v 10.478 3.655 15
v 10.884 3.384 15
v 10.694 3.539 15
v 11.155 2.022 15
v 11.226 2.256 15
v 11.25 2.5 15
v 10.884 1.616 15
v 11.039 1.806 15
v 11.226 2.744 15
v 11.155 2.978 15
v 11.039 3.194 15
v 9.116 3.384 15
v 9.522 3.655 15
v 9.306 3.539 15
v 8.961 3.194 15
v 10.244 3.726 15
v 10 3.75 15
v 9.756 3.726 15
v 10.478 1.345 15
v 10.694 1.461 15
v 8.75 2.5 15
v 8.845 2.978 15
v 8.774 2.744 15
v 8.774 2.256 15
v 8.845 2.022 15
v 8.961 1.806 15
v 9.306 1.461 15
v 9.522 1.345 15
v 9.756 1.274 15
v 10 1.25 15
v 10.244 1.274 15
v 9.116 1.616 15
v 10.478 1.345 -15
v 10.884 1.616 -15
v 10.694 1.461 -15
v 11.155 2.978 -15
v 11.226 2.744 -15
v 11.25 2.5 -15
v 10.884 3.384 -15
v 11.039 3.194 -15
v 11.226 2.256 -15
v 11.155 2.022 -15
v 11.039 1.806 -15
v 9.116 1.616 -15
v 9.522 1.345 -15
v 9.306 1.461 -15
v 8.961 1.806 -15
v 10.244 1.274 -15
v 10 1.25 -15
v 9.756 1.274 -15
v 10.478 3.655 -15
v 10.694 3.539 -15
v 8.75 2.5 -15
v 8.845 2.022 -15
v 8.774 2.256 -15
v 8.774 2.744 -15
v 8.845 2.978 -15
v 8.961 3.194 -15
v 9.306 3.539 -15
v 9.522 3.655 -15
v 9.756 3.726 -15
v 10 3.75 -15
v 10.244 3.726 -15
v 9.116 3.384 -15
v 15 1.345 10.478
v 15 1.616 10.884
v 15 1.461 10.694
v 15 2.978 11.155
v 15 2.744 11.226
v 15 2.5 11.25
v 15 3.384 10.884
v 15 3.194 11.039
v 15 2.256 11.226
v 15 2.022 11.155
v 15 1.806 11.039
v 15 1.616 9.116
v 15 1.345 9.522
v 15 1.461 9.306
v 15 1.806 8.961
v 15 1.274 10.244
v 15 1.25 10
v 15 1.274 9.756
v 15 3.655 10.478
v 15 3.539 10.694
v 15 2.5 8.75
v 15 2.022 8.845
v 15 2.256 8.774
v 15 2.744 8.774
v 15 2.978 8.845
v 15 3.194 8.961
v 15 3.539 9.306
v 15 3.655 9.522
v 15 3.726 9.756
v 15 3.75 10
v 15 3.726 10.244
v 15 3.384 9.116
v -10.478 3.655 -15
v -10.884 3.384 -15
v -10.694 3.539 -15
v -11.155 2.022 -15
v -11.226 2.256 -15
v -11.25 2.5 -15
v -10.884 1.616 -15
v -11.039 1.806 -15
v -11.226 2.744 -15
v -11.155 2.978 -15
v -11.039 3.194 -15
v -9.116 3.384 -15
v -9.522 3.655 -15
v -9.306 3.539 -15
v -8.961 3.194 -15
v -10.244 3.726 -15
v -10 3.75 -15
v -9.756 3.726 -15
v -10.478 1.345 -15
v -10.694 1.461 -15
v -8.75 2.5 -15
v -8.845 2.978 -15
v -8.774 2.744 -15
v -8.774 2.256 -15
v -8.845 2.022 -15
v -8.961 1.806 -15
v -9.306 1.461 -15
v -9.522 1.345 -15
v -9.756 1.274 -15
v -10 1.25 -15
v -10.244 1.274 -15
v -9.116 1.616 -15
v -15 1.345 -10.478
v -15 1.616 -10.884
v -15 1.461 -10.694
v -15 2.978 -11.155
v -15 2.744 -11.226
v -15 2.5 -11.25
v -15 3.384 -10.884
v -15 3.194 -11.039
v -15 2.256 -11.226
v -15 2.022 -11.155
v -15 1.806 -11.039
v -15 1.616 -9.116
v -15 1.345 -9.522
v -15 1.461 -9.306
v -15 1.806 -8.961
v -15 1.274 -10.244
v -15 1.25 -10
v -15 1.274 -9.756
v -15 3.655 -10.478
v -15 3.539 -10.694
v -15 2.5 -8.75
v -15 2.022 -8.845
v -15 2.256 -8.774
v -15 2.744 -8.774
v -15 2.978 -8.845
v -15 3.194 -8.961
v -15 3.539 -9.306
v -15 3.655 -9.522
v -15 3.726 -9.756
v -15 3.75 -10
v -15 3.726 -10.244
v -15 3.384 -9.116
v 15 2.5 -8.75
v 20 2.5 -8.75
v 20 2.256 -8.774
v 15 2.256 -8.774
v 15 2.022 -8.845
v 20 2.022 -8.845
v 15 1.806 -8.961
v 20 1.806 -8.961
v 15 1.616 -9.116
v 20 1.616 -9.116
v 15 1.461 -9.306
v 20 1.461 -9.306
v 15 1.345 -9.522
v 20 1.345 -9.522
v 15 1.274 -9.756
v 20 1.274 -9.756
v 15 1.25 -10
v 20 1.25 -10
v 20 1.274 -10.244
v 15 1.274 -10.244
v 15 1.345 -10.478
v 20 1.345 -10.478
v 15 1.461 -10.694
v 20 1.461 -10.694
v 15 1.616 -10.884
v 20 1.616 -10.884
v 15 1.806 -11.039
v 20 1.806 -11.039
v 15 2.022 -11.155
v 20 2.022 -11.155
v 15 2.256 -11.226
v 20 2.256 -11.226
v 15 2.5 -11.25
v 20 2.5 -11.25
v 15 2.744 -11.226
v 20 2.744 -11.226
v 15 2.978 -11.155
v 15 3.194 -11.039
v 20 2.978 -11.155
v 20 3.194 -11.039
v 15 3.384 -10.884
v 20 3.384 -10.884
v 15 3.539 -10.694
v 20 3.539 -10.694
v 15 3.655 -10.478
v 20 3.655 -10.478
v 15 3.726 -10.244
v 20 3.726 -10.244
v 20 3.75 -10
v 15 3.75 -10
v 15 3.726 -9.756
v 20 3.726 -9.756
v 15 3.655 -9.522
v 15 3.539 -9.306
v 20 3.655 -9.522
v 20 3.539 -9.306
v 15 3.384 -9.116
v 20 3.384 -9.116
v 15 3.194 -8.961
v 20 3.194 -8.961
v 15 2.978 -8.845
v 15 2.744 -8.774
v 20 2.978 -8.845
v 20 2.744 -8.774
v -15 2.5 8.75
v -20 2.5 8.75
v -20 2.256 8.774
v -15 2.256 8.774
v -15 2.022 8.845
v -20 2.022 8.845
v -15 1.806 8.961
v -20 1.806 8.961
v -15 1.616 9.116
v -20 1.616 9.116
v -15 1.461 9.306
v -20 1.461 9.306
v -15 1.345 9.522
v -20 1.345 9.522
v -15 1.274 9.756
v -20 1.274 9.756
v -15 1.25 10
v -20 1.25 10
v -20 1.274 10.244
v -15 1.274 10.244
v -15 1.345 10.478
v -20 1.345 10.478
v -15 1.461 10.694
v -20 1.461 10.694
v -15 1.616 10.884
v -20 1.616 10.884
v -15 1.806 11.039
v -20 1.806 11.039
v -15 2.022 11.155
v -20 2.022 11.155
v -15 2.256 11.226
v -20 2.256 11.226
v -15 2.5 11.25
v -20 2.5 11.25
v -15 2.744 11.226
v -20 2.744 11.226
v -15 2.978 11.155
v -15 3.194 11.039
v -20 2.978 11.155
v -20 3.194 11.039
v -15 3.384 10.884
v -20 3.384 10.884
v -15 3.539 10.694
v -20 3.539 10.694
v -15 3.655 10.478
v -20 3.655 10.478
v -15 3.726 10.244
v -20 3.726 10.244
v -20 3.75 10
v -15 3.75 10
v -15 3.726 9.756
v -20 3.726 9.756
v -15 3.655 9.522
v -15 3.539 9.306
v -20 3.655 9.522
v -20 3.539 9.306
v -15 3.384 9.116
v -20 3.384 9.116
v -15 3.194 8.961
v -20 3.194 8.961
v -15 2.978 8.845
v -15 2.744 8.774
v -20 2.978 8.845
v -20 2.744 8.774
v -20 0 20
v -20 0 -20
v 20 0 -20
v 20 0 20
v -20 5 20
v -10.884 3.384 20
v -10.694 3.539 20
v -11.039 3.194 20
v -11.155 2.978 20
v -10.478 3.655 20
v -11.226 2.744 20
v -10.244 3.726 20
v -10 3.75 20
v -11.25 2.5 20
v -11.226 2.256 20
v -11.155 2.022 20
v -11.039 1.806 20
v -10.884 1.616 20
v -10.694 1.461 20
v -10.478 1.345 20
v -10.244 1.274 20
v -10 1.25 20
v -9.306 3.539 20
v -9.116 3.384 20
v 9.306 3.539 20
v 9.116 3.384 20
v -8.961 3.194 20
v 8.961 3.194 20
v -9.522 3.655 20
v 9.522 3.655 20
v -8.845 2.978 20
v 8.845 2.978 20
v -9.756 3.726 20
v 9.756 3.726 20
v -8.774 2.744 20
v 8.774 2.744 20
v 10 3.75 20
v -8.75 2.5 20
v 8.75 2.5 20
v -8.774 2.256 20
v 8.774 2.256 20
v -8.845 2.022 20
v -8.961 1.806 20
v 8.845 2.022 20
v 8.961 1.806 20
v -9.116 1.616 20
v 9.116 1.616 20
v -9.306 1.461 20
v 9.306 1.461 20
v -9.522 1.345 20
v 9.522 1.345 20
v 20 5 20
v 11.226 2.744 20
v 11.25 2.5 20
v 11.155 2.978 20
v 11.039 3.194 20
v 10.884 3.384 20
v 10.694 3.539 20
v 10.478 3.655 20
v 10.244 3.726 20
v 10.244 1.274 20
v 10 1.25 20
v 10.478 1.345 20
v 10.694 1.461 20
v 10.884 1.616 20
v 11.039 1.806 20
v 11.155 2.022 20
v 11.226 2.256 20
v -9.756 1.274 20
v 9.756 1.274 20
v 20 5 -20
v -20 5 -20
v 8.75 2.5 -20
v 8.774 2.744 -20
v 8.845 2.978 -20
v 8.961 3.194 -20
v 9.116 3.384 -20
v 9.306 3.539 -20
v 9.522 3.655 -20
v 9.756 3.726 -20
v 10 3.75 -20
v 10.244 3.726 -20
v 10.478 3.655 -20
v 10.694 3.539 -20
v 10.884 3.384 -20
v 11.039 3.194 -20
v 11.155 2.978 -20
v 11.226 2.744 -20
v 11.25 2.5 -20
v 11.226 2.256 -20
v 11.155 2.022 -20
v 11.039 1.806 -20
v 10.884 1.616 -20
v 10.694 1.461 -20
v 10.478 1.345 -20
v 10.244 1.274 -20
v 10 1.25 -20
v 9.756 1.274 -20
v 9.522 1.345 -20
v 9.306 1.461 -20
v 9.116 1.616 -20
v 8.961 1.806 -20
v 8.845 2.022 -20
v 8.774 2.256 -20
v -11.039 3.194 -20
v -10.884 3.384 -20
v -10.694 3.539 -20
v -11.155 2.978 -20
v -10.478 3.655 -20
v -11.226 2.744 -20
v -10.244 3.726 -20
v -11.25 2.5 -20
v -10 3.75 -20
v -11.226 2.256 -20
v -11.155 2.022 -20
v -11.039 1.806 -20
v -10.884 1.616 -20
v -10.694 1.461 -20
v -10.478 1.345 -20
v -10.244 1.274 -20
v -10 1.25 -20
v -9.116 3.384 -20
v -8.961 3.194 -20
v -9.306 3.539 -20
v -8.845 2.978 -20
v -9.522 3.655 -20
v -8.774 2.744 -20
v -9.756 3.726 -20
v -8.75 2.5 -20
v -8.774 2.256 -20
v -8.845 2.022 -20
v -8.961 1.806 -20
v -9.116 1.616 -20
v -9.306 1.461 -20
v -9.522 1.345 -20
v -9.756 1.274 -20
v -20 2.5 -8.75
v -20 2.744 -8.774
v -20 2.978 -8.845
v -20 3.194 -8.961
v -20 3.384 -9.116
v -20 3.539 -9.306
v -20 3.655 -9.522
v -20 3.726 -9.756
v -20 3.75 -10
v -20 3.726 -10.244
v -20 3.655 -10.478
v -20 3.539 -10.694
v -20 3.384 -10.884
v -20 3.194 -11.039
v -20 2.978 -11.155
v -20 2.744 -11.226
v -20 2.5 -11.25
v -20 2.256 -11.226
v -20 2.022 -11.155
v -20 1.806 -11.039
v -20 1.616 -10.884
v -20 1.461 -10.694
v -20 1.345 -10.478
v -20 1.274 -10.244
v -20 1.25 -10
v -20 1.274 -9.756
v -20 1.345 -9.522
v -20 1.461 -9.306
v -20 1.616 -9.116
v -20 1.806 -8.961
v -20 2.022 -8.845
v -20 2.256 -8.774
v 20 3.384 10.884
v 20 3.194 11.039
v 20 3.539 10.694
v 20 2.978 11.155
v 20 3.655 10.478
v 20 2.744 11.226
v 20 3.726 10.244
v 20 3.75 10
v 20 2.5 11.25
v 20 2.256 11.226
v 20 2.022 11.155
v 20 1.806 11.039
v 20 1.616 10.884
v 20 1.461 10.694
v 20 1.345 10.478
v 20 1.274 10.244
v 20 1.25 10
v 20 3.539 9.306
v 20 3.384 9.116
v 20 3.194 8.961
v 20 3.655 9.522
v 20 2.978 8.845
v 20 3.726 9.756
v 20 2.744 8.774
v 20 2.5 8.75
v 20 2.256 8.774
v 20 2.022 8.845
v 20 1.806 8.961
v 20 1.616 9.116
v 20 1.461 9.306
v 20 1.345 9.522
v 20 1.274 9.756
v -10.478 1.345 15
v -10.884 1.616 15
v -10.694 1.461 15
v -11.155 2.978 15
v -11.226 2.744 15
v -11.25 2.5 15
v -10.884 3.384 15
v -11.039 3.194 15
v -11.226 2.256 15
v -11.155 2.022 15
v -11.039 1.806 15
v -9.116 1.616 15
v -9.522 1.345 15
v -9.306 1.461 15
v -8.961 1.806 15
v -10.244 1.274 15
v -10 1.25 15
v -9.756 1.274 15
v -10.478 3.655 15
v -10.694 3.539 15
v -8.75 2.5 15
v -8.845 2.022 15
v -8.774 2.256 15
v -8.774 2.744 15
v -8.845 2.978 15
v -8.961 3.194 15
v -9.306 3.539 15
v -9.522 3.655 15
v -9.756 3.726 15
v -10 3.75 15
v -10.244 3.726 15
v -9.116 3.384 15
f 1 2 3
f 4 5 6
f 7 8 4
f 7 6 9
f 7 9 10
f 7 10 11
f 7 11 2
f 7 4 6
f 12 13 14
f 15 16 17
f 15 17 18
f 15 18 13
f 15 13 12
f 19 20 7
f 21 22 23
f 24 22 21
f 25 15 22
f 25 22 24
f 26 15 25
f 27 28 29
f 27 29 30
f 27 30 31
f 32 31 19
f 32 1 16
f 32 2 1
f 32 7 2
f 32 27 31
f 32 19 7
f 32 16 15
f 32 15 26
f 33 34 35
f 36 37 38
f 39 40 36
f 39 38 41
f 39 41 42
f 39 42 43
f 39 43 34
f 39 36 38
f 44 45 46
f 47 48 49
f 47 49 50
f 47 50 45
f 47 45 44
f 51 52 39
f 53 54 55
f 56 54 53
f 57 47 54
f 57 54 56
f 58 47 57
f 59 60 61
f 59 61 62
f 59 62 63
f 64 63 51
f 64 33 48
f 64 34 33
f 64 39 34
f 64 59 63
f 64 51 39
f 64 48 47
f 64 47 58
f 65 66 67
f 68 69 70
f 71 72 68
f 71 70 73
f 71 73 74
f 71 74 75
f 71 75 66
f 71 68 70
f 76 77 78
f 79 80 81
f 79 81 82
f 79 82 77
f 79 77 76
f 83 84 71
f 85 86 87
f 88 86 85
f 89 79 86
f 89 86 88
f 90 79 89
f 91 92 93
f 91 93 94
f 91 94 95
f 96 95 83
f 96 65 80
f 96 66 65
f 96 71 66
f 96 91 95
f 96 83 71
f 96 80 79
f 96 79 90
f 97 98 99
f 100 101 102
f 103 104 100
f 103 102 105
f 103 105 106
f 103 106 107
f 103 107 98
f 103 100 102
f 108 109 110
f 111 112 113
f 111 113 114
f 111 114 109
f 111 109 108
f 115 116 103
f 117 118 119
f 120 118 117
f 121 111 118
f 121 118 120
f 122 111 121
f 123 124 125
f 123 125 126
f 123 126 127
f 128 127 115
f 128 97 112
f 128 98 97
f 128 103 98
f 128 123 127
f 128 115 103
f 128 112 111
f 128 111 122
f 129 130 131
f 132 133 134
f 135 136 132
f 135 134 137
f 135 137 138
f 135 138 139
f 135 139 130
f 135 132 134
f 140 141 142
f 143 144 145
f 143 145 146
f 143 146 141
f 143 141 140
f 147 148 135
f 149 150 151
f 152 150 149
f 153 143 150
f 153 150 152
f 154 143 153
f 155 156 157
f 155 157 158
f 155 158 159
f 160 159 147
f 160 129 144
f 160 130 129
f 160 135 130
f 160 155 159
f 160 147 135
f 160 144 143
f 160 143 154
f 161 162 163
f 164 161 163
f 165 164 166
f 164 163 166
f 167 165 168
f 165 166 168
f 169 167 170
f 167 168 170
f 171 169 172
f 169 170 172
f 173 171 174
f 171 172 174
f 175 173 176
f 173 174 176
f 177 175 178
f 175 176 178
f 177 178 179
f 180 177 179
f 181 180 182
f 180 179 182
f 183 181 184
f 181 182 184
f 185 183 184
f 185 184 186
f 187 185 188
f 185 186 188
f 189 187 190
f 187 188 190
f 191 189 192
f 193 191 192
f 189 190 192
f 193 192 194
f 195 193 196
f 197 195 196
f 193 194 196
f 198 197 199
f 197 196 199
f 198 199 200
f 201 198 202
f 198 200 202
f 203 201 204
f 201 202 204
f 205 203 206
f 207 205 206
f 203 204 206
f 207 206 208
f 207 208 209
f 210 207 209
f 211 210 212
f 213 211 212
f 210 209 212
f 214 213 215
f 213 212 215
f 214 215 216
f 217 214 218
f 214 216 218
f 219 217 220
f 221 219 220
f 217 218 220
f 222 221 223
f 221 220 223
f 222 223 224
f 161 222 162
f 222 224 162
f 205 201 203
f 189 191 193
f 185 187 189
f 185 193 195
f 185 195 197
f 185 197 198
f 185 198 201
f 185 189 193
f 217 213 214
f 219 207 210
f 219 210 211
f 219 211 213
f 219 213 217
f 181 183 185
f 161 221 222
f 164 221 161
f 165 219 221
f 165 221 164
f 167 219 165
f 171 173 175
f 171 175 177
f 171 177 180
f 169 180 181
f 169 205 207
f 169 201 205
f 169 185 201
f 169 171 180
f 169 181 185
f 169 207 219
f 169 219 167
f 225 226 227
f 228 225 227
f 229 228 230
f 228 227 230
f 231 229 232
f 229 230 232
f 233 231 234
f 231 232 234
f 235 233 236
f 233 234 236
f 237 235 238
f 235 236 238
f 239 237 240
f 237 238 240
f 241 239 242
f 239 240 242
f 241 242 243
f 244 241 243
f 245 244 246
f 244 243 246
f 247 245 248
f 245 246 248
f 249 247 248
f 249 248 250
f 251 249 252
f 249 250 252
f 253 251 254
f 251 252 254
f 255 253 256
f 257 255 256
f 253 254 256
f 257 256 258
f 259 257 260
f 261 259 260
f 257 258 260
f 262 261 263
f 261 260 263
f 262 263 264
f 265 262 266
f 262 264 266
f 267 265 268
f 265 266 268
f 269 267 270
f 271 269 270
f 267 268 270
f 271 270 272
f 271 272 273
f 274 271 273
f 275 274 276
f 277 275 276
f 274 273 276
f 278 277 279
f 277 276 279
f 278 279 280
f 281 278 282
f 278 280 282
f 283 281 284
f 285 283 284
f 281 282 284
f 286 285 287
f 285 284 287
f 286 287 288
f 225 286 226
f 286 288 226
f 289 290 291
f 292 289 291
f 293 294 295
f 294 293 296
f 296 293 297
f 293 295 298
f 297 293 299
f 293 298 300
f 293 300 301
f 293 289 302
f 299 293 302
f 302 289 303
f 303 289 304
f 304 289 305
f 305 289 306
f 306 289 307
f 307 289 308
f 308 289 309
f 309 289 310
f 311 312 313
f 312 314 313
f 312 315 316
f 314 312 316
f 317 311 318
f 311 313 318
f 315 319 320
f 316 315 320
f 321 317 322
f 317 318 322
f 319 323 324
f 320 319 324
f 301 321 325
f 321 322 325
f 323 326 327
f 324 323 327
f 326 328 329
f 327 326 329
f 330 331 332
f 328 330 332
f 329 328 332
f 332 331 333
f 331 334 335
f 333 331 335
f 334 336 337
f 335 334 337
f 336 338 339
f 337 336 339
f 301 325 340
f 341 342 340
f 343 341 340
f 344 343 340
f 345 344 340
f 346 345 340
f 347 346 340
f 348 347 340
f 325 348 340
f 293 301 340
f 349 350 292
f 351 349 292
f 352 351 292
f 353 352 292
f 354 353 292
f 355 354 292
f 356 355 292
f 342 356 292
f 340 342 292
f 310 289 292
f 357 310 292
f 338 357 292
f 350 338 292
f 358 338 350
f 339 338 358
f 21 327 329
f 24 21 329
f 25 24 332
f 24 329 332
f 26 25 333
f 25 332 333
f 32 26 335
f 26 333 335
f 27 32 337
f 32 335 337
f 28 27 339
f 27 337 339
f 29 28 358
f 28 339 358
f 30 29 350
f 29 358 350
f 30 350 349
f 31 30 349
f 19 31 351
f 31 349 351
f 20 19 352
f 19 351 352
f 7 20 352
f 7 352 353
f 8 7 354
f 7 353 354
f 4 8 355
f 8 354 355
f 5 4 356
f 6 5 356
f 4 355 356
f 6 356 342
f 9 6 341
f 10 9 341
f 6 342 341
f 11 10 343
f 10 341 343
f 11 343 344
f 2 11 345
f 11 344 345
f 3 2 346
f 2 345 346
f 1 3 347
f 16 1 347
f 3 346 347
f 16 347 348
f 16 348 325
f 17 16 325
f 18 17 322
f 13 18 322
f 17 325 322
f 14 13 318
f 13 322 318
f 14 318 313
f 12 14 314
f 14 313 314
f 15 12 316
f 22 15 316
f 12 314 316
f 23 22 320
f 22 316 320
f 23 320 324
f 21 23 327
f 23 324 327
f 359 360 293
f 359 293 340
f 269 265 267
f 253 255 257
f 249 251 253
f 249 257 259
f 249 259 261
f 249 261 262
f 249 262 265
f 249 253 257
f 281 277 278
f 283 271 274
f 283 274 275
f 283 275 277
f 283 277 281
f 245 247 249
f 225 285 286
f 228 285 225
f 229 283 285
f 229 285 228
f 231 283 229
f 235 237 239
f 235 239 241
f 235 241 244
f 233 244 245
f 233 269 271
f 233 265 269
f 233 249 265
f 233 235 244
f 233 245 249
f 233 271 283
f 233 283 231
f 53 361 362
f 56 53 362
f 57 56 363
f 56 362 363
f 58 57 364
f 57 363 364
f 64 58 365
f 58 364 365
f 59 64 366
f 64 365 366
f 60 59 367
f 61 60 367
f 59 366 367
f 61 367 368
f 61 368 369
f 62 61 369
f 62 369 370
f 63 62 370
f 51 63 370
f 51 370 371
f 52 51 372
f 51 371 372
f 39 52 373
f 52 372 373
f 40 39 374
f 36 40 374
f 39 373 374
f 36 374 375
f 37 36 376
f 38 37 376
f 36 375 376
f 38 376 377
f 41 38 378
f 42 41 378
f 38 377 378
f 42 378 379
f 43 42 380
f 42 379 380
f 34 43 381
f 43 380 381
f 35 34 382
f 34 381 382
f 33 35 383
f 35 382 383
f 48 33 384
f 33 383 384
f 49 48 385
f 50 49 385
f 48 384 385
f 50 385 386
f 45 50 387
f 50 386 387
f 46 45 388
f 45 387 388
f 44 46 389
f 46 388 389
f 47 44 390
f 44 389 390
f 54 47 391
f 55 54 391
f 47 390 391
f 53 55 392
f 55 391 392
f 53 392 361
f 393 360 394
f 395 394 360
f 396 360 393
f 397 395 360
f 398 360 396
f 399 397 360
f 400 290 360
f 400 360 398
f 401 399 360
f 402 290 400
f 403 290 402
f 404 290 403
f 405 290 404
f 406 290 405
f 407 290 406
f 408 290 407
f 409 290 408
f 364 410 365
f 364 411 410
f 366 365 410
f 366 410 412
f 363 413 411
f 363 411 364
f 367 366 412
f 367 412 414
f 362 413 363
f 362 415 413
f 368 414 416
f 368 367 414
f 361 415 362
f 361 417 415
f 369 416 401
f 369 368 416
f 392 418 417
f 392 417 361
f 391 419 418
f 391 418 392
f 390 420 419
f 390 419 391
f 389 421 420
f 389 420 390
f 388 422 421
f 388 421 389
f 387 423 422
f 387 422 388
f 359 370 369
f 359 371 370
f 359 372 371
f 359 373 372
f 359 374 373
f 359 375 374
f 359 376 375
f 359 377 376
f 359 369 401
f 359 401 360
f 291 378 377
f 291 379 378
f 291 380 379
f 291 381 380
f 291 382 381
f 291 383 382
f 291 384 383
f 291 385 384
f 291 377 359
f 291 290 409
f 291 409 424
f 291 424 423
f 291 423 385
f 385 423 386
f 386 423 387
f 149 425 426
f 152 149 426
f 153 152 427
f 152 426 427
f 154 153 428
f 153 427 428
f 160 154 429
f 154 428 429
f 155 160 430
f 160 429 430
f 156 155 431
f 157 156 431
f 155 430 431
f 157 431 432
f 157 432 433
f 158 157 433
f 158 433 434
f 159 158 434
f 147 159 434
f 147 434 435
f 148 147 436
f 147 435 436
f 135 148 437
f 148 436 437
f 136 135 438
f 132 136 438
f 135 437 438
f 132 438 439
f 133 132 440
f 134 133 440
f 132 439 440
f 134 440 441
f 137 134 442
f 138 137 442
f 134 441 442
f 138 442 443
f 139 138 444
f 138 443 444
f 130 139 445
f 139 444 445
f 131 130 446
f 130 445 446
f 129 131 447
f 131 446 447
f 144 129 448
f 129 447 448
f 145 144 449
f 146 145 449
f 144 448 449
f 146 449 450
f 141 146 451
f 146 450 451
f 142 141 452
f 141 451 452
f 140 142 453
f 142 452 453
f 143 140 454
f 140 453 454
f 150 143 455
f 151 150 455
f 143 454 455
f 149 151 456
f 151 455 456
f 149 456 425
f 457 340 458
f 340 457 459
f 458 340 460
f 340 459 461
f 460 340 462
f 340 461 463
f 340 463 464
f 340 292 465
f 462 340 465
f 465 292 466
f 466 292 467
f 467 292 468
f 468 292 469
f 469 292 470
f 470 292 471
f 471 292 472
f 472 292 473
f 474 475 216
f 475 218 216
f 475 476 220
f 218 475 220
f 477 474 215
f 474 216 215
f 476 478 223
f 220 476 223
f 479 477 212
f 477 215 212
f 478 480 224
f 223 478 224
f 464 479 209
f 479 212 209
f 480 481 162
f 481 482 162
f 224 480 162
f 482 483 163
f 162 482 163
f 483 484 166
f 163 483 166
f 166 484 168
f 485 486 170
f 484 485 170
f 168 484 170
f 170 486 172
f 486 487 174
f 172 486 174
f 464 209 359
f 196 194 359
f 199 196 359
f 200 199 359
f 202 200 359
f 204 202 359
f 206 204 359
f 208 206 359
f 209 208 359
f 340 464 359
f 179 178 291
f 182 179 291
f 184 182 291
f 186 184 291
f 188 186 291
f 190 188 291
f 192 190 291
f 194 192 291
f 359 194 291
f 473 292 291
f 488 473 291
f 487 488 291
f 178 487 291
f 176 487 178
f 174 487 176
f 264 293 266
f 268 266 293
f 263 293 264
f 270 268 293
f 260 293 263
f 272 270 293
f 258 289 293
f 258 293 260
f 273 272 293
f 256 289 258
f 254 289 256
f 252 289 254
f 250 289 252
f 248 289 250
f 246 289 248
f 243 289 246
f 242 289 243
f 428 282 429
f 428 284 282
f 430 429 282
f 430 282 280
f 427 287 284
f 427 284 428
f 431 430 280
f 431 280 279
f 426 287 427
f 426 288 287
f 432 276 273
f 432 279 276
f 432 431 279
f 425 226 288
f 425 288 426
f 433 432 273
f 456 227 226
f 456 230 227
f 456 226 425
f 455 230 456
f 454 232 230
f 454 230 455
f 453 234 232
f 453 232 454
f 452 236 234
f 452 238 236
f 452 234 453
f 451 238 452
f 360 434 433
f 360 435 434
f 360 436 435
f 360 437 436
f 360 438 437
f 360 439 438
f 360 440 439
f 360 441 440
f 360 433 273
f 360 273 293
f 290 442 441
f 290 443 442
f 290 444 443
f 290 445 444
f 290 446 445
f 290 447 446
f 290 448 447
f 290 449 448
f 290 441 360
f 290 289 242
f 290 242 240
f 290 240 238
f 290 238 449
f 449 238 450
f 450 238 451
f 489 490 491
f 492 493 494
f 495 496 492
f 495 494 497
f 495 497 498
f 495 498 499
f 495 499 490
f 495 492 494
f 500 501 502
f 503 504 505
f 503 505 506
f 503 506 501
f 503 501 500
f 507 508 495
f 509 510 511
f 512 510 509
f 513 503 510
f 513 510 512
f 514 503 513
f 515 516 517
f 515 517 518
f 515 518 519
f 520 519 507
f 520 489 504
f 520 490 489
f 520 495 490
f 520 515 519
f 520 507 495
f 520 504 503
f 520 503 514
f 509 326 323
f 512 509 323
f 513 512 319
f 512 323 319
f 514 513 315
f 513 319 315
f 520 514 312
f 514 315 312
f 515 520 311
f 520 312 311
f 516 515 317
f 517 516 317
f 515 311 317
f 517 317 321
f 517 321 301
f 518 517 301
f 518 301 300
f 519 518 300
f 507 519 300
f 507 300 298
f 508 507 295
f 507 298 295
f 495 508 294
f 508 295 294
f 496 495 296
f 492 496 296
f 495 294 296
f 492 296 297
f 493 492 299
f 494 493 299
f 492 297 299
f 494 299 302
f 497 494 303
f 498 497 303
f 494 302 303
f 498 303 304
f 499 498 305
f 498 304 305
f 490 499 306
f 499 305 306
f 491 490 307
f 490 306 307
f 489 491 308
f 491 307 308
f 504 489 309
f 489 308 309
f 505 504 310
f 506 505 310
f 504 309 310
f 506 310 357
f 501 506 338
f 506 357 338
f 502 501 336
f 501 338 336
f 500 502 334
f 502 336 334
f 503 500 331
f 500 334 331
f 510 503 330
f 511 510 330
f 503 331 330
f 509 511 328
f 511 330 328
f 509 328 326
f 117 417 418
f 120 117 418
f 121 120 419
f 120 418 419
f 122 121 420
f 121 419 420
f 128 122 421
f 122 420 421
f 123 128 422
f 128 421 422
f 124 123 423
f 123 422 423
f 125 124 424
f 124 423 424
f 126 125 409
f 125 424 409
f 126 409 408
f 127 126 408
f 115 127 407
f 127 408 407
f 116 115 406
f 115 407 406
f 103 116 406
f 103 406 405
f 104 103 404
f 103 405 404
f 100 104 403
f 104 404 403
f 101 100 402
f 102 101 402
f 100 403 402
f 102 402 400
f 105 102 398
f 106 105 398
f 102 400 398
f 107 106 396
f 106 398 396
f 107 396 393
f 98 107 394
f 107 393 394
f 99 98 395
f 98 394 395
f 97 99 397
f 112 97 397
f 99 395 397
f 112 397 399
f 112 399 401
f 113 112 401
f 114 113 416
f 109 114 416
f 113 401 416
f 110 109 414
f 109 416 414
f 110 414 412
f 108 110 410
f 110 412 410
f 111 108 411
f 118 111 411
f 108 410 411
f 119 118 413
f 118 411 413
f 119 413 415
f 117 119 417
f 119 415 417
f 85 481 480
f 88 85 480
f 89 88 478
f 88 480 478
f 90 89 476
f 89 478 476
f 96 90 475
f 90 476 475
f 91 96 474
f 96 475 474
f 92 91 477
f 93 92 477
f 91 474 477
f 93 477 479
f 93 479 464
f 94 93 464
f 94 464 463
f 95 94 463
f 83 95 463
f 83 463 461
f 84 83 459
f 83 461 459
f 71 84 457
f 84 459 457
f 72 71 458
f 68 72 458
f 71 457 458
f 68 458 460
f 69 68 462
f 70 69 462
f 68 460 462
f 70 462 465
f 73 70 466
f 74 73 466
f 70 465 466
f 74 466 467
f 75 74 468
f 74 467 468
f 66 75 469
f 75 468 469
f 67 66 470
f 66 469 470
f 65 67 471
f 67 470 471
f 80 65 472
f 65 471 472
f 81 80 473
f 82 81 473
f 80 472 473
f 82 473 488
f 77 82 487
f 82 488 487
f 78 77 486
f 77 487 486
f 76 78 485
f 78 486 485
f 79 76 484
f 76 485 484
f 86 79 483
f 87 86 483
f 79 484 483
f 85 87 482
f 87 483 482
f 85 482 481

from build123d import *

# Parameters (mm, degrees)
SKETCH1_W           = 40
SKETCH1_H           = 40
BOSS_EXTRUDE1_DEPTH = 5
SKETCH2_R           = 1.25
CUT_EXTRUDE1_DEPTH  = 5
CIRPATTERN1_COUNT   = 4


with BuildPart() as part:
    # Sketch1 → Boss-Extrude1 (new body)
    with BuildSketch(Plane(origin=(0, 0, 0), x_dir=(1, 0, 0), z_dir=(0, 1, 0))):
        Rectangle(SKETCH1_W, SKETCH1_H)
    extrude(amount=BOSS_EXTRUDE1_DEPTH)

    # Sketch2 → Cut-Extrude1 (cut)
    with BuildSketch(Plane.XY.offset(20)):
        with Locations((-10, 2.5)):
            Circle(SKETCH2_R)
        with Locations(Location((10, 2.5, 0), (0, 0, 180))):
            Circle(SKETCH2_R)
    cut_extrude1 = extrude(amount=-CUT_EXTRUDE1_DEPTH, mode=Mode.SUBTRACT)

    # CirPattern1: Cut-Extrude1 ×4 about axis
    cirpattern1_axis = Axis((0, 0, 0), (0, 1, 0))
    for i in range(1, CIRPATTERN1_COUNT):
        add(cut_extrude1.rotate(cirpattern1_axis, i * 360 / CIRPATTERN1_COUNT), mode=Mode.SUBTRACT)


solid = part.part
